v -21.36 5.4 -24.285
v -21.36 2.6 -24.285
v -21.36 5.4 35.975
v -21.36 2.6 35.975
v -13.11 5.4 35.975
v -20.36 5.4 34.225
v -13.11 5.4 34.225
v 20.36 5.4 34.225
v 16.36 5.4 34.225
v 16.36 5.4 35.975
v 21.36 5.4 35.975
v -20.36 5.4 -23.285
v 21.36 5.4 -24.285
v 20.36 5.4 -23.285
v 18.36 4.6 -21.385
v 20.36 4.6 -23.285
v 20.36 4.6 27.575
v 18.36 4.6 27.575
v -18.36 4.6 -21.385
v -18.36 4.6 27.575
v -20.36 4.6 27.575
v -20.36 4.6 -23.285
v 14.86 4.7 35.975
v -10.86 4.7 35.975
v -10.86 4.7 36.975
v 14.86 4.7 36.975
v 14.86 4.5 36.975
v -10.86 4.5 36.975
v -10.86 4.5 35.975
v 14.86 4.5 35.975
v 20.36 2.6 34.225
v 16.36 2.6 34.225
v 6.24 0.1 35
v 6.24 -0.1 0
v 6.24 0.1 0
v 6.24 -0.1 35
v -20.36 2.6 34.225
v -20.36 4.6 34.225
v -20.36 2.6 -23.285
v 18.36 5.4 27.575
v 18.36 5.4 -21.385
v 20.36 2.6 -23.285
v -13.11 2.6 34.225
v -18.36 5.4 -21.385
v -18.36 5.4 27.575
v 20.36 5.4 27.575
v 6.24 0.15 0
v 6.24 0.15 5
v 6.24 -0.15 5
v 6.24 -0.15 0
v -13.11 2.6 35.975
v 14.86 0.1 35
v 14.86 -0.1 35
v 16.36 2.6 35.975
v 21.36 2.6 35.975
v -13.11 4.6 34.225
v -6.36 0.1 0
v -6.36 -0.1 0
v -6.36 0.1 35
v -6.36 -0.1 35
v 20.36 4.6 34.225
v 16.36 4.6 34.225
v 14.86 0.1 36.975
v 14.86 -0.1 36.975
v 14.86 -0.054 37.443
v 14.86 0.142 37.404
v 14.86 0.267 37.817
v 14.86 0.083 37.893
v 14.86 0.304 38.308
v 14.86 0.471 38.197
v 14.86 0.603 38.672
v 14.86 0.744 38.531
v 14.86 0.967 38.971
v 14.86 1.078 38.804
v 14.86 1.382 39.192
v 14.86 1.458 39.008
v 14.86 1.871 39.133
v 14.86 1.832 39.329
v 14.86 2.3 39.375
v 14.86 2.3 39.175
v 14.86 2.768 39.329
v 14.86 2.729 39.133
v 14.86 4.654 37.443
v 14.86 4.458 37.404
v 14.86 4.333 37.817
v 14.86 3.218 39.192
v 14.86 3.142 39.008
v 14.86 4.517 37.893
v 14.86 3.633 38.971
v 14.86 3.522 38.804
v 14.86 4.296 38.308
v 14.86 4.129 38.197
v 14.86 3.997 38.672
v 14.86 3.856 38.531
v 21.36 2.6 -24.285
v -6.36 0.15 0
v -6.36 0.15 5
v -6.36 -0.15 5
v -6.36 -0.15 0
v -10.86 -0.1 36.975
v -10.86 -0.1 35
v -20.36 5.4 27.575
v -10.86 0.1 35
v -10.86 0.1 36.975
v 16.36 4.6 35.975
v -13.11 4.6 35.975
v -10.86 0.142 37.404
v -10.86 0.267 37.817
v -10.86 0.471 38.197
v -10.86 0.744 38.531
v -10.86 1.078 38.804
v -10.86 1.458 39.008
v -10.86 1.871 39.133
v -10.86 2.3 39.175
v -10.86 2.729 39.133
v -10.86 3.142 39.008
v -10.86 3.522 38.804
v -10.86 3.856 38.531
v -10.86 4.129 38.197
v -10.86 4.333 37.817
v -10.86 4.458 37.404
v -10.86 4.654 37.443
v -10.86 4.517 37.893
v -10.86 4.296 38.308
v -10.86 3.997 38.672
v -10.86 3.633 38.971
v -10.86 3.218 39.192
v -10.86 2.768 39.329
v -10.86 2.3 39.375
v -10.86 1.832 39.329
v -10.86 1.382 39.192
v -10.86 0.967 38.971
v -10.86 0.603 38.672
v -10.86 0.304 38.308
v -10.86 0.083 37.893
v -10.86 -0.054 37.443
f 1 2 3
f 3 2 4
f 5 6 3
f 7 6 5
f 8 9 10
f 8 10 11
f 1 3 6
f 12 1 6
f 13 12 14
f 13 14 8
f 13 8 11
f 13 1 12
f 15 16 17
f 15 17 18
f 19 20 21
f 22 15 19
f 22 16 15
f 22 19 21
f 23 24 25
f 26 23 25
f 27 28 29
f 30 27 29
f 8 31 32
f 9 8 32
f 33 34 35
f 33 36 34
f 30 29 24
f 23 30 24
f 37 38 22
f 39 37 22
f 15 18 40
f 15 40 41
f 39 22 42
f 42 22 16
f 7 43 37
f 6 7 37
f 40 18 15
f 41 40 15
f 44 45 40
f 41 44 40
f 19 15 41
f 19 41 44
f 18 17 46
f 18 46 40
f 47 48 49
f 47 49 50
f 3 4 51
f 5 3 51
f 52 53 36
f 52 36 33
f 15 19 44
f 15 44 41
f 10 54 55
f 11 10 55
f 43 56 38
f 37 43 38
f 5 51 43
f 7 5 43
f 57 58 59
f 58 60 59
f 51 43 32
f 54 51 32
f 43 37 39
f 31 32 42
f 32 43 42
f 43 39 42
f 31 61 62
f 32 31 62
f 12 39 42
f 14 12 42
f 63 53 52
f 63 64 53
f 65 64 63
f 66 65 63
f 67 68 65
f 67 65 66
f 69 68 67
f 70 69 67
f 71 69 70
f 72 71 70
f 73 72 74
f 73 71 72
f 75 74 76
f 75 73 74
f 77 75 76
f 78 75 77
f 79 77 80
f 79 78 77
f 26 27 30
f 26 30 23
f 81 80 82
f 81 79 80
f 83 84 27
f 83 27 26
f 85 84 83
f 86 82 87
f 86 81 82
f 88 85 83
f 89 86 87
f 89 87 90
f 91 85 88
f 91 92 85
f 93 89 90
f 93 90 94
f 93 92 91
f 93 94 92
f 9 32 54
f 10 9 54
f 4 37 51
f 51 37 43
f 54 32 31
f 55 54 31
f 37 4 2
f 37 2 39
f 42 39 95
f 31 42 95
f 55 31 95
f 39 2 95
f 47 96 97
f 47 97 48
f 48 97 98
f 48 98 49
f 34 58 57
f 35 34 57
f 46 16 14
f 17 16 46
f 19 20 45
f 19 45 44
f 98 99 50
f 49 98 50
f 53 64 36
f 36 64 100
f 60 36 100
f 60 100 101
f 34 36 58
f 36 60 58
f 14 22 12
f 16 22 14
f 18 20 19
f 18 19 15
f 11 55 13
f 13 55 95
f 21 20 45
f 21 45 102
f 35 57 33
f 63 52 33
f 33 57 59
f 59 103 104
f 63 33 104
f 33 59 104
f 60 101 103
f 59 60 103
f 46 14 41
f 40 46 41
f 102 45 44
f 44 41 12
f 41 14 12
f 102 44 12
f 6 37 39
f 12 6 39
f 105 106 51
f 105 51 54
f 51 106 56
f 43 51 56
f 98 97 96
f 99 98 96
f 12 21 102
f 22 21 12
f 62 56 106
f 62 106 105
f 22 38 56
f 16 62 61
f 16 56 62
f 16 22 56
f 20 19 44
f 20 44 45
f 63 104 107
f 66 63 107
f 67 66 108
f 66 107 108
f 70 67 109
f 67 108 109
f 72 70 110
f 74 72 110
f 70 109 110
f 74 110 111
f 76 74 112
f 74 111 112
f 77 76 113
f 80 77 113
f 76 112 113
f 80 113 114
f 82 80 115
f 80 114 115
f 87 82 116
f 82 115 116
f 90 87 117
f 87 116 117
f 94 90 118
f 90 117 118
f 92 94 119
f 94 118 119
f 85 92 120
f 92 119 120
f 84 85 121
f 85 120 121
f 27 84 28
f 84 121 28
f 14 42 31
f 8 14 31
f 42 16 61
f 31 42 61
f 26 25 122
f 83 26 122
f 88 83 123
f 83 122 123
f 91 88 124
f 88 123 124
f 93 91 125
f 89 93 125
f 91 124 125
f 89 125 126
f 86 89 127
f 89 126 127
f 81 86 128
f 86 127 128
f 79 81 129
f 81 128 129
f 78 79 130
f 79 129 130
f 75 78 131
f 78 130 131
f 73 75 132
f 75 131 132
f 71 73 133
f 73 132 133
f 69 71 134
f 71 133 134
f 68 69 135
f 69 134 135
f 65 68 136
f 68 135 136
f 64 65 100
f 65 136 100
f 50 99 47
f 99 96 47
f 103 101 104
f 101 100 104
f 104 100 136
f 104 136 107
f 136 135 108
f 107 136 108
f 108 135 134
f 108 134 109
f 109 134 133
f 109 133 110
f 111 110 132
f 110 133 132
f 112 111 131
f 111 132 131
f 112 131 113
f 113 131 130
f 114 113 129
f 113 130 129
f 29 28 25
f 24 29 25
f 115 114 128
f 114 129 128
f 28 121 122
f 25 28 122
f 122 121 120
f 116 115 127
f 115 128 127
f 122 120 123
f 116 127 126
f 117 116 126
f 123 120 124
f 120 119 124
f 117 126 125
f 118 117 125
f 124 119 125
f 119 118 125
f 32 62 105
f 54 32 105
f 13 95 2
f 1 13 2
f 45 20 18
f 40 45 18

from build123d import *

# Parameters (mm, degrees)
SKETCH2_W                = 42.72
SKETCH2_H                = 60.26
BOSS_EXTRUDE1_DEPTH      = 2
SKETCH3_W                = 36.72
SKETCH3_H                = 48.96
BOSS_EXTRUDE2_DEPTH      = 0.8
BOSS_EXTRUDE3_DEPTH      = 0.8
BOSS_EXTRUDE4_DEPTH      = 0.8
BOSS_EXTRUDE4_DEPTH_BACK = 2
CUT_EXTRUDE1_DEPTH       = 42.886157916
SKETCH13_W               = 12.6
SKETCH13_H               = 5
BOSS_EXTRUDE6_DEPTH      = 0.15
THICKEN4_START           = -6.36
THICKEN4_DEPTH           = 12.6
THICKEN4_START_2         = -10.86
THICKEN4_2_DEPTH         = 25.72


# Read off the part's stored shape, not the designer's step: Thicken4
with BuildPart() as part:
    # Sketch2 → Boss-Extrude1 (new body)
    with BuildSketch(Plane(origin=(0, 4.6, 0), x_dir=(1, 0, 0), z_dir=(0, 1, 0))):
        with Locations((0, -5.845)):
            Rectangle(SKETCH2_W, SKETCH2_H)
    extrude(amount=-BOSS_EXTRUDE1_DEPTH)

    # Sketch5<2> → Cut-Extrude1 (cut, through all)
    with BuildSketch(Plane(origin=(0, 4.6, 0), x_dir=(1, 0, 0), z_dir=(0, 1, 0))):
        Polygon((-20.36, 23.285), (20.36, 23.285), (20.36, -34.225), (16.36, -34.225), (16.36, -35.975), (21.36, -35.975), (21.36, 24.285), (-21.36, 24.285), (-21.36, -35.975), (-13.11, -35.975), (-13.11, -34.225), (-20.36, -34.225), align=None)
    extrude(amount=-CUT_EXTRUDE1_DEPTH, mode=Mode.SUBTRACT)


with BuildPart() as body_2:
    # Sketch3 → Boss-Extrude2 (new body)
    with BuildSketch(Plane(origin=(0, 4.6, 0), x_dir=(1, 0, 0), z_dir=(0, 1, 0))):
        with Locations((0, -3.095)):
            Rectangle(SKETCH3_W, SKETCH3_H)
    extrude(amount=BOSS_EXTRUDE2_DEPTH)


with BuildPart() as body_3:
    # Sketch4 → Boss-Extrude3 (new body)
    with BuildSketch(Plane(origin=(0, 4.6, 0), x_dir=(1, 0, 0), z_dir=(0, 1, 0))):
        Polygon((-18.36, -27.575), (-20.36, -27.575), (-20.36, 23.285), (20.36, 23.285), (20.36, -27.575), (18.36, -27.575), (18.36, 21.385), (-18.36, 21.385), align=None)
    extrude(amount=BOSS_EXTRUDE3_DEPTH)


with BuildPart() as body_4:
    # Sketch5 → Boss-Extrude4 (new, two sides: drawn at the far end of the back side and taken through both)
    with BuildSketch(Plane(origin=(0, 4.6, 0), x_dir=(1, 0, 0), z_dir=(0, 1, 0)).offset(-BOSS_EXTRUDE4_DEPTH_BACK)):
        Polygon((-20.36, 23.285), (20.36, 23.285), (20.36, -34.225), (16.36, -34.225), (16.36, -35.975), (21.36, -35.975), (21.36, 24.285), (-21.36, 24.285), (-21.36, -35.975), (-13.11, -35.975), (-13.11, -34.225), (-20.36, -34.225), align=None)
    extrude(amount=BOSS_EXTRUDE4_DEPTH + BOSS_EXTRUDE4_DEPTH_BACK)


with BuildPart() as body_5:
    # Sketch13 → Boss-Extrude6 (new, symmetric)
    with BuildSketch(Plane(origin=(0, 0, 0), x_dir=(1, 0, 0), z_dir=(0, 1, 0))):
        with Locations((-0.06, -2.5)):
            Rectangle(SKETCH13_W, SKETCH13_H)
    extrude(amount=BOSS_EXTRUDE6_DEPTH, both=True)


with BuildPart() as body_6:
    # Thicken4 outline → Thicken4 (new body)
    with BuildSketch(Plane.YZ.offset(THICKEN4_START)):
        with BuildLine():
            Line((0.1, 0), (0.1, 36.975))
            ThreePointArc((0.1, 36.975), (2.3, 39.175), (4.5, 36.975))
            Line((4.5, 36.975), (4.5, 35.975))
            Line((4.5, 35.975), (4.7, 35.975))
            Line((4.7, 35.975), (4.7, 36.975))
            ThreePointArc((4.7, 36.975), (2.3, 39.375), (-0.1, 36.975))
            Line((-0.1, 36.975), (-0.1, 0))
            Line((-0.1, 0), (0.1, 0))
        make_face()
    extrude(amount=THICKEN4_DEPTH)

    # Thicken4 2 outline → Thicken4 2 (add)
    with BuildSketch(Plane.YZ.offset(THICKEN4_START_2)):
        with BuildLine():
            Line((-0.1, 35), (0.1, 35))
            Line((0.1, 35), (0.1, 36.975))
            ThreePointArc((0.1, 36.975), (2.3, 39.175), (4.5, 36.975))
            Line((4.5, 36.975), (4.5, 35.975))
            Line((4.5, 35.975), (4.7, 35.975))
            Line((4.7, 35.975), (4.7, 36.975))
            ThreePointArc((4.7, 36.975), (2.3, 39.375), (-0.1, 36.975))
            Line((-0.1, 36.975), (-0.1, 35))
        make_face()
    extrude(amount=THICKEN4_2_DEPTH)


solid = Compound([part.part, body_2.part, body_3.part, body_4.part, body_5.part, body_6.part])
